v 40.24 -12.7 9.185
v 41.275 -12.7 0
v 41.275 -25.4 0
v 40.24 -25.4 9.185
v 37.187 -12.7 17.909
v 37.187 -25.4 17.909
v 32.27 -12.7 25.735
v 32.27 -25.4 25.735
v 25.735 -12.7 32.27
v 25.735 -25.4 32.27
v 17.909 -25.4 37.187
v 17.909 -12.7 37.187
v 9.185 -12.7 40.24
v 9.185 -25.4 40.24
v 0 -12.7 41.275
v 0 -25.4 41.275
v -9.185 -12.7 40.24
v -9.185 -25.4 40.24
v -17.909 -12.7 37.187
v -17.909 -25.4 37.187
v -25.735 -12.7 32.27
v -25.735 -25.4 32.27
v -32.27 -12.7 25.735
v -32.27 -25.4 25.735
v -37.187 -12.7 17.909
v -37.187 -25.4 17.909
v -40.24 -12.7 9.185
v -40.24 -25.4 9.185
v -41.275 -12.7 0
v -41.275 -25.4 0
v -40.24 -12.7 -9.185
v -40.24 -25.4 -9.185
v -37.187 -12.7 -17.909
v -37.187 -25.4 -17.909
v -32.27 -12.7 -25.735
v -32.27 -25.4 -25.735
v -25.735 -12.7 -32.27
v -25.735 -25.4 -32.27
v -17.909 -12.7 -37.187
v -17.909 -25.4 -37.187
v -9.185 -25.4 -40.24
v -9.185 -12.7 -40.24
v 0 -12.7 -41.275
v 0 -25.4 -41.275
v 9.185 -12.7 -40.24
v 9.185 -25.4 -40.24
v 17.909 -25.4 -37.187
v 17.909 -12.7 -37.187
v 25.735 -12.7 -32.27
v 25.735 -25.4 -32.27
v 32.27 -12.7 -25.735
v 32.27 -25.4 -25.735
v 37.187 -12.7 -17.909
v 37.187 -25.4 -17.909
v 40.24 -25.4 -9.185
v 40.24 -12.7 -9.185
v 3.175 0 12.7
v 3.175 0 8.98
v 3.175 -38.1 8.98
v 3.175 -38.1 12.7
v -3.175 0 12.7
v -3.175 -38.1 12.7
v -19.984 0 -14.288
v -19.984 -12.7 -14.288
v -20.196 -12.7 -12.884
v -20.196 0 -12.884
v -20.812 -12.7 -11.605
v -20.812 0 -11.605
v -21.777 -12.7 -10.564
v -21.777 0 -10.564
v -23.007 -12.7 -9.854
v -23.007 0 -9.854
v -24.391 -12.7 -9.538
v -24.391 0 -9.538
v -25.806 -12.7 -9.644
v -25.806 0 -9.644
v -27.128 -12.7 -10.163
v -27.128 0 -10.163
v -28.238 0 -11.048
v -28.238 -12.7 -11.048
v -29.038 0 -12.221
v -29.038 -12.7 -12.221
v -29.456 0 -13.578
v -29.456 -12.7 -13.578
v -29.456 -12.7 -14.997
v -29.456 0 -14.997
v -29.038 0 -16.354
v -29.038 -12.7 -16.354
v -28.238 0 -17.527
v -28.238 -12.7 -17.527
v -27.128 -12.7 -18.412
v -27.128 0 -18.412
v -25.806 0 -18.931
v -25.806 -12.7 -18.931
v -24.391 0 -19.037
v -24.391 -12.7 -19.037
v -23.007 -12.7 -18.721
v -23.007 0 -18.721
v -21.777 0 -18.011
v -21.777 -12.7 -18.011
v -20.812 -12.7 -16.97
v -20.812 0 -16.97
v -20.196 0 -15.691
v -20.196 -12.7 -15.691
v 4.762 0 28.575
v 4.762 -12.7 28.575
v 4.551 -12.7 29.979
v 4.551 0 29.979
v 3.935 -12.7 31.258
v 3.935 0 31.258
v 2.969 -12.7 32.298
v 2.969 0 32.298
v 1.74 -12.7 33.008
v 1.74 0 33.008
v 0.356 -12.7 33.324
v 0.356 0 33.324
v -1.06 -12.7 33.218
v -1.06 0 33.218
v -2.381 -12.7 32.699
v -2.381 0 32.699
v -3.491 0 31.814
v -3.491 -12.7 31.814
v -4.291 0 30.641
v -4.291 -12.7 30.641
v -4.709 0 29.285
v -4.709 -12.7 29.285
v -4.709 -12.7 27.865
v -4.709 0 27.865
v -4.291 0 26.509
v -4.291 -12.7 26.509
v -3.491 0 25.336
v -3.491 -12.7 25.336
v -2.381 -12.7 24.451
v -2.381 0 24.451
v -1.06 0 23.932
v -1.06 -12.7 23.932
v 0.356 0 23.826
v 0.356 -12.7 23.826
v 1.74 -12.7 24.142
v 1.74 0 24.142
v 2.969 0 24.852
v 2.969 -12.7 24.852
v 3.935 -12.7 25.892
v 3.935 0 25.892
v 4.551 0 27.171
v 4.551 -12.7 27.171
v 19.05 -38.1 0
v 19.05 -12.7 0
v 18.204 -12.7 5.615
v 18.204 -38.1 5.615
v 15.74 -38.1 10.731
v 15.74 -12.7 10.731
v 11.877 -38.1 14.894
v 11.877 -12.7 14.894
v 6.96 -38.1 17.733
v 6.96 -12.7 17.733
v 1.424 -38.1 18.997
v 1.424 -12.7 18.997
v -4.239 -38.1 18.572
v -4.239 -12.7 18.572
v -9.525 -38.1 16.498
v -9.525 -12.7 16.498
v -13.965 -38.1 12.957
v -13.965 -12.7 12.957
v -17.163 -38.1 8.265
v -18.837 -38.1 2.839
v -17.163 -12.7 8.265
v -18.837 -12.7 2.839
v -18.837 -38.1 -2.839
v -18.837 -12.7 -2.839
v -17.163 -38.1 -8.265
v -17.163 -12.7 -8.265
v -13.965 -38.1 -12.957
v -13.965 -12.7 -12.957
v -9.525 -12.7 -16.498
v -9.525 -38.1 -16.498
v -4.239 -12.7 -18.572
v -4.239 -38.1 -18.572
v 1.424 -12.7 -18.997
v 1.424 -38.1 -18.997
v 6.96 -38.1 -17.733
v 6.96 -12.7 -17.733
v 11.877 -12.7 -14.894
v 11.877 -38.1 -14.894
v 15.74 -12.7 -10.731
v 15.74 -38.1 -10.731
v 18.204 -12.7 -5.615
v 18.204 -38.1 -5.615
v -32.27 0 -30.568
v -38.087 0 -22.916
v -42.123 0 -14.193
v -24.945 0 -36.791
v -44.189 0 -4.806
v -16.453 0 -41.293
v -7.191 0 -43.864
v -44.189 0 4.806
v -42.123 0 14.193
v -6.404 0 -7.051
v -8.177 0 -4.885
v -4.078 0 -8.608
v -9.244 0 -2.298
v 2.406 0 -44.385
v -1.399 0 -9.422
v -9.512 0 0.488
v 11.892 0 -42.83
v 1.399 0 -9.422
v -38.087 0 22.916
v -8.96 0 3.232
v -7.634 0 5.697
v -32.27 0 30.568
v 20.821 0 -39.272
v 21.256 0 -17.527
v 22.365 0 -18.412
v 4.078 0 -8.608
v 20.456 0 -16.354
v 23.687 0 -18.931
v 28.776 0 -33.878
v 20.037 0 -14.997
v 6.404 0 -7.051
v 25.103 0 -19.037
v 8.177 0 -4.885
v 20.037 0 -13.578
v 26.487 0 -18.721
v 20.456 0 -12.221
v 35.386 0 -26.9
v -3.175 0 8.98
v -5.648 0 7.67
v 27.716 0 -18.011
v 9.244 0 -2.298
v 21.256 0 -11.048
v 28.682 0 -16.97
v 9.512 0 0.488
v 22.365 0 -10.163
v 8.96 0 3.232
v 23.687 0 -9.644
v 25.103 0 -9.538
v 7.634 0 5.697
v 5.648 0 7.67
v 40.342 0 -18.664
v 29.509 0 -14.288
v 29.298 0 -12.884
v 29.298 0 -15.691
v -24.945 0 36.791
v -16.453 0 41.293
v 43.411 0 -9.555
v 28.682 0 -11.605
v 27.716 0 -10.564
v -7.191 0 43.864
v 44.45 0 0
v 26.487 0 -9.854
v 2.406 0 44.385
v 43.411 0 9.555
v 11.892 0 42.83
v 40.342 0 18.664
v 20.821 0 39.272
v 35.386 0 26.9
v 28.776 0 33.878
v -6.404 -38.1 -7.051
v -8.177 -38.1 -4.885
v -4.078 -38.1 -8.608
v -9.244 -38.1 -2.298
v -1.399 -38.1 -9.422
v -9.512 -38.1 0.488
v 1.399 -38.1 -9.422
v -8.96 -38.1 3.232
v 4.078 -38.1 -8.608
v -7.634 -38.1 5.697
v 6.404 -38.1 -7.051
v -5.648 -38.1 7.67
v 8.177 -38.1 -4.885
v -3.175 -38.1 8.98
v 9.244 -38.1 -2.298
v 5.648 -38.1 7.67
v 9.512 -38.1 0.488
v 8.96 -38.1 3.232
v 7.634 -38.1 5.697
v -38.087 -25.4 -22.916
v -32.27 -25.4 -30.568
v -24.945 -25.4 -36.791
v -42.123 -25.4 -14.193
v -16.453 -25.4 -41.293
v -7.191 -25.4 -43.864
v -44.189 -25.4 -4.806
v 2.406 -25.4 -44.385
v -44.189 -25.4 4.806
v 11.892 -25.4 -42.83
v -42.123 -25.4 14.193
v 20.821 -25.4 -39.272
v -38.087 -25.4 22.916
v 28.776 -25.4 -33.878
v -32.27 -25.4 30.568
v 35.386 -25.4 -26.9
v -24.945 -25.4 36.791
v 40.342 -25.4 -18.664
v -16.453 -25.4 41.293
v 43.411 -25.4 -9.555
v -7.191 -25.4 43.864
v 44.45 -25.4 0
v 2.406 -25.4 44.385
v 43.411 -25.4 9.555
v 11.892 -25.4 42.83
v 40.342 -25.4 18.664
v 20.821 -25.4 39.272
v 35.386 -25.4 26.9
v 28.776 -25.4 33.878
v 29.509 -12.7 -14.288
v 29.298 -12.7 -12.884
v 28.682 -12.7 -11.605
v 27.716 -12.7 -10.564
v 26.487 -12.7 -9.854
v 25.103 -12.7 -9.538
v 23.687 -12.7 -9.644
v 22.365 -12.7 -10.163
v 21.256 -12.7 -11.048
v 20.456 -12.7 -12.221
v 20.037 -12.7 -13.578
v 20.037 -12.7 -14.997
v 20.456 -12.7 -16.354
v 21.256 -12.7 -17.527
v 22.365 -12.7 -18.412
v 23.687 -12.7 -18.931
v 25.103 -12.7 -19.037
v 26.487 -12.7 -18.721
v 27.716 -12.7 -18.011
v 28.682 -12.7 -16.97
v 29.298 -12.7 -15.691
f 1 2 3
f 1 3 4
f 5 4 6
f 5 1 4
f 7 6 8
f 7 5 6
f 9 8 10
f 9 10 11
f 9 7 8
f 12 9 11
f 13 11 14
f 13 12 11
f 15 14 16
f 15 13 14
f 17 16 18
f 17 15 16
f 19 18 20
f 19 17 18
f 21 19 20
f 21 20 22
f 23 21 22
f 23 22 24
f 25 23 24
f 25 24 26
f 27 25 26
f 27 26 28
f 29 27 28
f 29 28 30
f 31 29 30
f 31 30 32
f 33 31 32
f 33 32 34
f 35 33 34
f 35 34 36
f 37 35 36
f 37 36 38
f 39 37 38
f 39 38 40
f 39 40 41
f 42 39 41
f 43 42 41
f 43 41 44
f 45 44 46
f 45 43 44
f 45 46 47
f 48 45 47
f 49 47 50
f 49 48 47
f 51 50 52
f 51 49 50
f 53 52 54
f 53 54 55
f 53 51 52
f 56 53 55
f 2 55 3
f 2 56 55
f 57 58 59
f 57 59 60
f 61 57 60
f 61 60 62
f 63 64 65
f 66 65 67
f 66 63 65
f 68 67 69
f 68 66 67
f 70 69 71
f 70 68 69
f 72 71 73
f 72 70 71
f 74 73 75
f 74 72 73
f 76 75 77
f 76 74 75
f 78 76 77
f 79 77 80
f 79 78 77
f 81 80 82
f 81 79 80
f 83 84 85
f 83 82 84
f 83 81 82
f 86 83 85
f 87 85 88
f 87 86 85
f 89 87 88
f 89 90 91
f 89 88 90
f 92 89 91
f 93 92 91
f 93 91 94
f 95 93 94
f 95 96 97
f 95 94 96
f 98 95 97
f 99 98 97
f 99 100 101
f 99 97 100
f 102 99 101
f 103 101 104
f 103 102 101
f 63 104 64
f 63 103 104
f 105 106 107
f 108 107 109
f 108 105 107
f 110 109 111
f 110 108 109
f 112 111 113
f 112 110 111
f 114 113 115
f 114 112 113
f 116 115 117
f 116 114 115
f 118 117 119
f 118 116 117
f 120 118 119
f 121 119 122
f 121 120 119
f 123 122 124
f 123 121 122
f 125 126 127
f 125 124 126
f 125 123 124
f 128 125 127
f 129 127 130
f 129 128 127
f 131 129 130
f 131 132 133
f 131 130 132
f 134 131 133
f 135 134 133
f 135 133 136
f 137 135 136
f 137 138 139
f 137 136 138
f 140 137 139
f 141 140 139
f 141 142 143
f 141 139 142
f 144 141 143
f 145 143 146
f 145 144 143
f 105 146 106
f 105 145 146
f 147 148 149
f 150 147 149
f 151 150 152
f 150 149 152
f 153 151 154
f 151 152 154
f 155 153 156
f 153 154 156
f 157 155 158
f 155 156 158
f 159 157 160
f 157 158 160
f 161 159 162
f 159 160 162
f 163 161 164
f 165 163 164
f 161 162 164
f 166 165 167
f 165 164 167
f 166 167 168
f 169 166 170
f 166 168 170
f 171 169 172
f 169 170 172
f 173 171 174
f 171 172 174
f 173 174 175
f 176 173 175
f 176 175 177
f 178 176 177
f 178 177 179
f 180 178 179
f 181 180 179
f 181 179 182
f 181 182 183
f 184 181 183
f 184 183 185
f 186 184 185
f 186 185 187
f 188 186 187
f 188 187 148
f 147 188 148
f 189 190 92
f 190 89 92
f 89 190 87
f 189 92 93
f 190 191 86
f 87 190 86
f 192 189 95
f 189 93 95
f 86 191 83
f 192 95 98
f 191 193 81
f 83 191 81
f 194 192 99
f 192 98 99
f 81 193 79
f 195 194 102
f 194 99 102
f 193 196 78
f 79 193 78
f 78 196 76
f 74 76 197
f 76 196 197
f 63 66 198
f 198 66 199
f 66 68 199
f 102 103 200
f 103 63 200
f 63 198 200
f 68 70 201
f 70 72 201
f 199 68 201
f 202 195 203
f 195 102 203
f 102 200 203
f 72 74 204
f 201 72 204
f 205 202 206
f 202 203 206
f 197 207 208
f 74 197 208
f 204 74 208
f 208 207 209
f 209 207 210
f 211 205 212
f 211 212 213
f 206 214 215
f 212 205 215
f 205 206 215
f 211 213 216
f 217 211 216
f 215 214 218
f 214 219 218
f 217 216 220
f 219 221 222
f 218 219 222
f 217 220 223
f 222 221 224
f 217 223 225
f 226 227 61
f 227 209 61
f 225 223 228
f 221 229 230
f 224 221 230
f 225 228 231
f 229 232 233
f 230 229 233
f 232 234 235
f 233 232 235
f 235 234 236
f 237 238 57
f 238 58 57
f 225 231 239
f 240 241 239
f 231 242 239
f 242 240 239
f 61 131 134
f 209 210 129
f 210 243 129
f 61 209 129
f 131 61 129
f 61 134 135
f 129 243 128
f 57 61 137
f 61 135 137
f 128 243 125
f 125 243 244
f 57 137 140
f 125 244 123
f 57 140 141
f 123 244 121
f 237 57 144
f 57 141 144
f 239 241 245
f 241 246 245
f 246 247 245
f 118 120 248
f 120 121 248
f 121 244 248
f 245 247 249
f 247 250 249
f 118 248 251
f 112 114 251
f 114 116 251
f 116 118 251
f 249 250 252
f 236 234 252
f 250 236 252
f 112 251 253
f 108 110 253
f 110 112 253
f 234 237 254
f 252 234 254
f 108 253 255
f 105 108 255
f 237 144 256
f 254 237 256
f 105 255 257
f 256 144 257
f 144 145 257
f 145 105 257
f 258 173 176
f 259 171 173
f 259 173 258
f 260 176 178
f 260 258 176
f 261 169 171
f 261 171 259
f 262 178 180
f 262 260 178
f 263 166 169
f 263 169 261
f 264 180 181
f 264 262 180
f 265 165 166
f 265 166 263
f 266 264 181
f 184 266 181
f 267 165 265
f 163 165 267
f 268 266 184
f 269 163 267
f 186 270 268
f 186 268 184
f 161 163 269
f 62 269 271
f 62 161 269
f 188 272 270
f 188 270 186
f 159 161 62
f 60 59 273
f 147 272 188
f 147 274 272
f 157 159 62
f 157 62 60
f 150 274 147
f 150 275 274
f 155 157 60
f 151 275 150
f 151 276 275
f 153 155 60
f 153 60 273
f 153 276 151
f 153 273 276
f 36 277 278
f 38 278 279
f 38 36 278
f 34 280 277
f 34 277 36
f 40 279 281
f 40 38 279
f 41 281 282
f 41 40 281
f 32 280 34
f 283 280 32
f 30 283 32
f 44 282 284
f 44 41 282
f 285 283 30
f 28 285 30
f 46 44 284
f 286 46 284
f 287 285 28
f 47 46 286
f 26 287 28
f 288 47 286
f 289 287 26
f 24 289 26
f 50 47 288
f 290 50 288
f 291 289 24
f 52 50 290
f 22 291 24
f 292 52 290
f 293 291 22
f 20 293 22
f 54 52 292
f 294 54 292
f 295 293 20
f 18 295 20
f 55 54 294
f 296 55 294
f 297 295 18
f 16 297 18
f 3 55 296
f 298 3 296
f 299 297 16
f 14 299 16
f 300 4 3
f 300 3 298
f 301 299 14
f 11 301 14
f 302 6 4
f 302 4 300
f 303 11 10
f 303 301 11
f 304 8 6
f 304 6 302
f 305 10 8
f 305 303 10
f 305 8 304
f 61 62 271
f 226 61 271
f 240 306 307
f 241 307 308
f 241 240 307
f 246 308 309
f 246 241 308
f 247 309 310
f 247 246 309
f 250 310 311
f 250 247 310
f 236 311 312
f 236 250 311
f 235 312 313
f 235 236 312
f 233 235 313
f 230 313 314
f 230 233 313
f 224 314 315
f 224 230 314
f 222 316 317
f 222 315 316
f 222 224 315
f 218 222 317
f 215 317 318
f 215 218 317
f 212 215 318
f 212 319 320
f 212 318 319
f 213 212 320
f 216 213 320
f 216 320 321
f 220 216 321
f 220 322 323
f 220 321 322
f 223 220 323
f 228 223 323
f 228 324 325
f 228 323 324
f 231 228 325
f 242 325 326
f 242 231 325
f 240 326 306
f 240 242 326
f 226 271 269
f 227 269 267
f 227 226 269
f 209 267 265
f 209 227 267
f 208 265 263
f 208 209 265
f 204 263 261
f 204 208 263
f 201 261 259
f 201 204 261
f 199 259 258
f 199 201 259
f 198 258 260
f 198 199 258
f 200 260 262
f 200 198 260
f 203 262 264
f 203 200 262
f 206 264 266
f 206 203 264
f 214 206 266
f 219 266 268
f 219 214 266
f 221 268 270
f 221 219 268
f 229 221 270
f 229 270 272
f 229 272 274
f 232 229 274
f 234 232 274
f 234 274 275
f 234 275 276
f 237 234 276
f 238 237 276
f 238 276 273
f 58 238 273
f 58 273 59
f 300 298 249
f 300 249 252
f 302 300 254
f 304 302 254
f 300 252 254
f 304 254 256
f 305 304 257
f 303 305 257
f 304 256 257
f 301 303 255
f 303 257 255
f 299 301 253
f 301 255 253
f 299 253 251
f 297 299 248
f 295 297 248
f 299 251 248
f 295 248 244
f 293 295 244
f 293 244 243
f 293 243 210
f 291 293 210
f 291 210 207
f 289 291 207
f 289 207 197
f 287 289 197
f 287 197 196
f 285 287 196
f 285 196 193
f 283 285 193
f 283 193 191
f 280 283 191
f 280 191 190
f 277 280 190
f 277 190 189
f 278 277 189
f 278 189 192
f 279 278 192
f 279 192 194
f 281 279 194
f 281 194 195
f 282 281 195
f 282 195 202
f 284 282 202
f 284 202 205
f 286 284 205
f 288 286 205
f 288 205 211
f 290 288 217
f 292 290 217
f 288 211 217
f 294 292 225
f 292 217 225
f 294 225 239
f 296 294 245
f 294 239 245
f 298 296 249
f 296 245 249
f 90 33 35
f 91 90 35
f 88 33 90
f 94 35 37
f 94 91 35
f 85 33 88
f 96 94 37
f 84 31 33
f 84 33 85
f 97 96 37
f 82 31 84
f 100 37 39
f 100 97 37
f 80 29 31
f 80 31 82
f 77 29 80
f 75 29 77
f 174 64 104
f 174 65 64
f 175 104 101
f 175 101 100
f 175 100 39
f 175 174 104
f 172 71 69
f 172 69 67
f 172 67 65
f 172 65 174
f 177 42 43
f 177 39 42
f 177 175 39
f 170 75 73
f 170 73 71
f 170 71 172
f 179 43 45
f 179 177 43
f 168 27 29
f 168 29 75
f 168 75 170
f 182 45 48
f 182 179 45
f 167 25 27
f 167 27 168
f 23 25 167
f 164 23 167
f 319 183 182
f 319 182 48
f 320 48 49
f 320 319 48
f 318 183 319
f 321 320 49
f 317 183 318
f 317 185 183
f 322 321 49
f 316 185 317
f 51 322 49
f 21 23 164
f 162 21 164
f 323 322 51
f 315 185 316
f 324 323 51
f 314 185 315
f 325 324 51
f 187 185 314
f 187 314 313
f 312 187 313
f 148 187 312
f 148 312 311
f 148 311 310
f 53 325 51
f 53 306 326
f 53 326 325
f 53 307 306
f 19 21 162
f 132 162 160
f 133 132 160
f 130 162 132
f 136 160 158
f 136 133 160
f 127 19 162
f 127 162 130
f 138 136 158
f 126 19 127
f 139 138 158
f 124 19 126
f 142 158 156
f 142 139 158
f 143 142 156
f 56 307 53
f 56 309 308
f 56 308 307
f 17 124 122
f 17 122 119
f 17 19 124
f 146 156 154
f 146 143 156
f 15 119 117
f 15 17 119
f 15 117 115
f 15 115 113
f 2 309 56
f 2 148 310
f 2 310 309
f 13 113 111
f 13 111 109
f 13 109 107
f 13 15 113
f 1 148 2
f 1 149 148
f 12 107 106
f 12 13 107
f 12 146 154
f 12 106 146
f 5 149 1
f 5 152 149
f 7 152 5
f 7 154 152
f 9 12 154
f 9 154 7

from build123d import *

# Parameters (mm, degrees)
F0_R      = 44.45
F1_DEPTH  = 12.7
F2_R      = 19.05
F3_DEPTH  = 38.1
F4_R      = 9.525
F5_DEPTH  = 38.101
F7_DEPTH  = 38.101
F8_R      = 4.7625
F9_DEPTH  = 38.101
F10_R     = 44.45
F10_R_2   = 41.275
F11_DEPTH = 25.4


with BuildPart() as f1:
    # F0 (on Front) → F1 (new body)
    with BuildSketch(Plane.XZ):
        Circle(F0_R)
    extrude(amount=F1_DEPTH)

    # F2 (on Front) → F3 (join)
    with BuildSketch(Plane.XZ):
        Circle(F2_R)
    extrude(amount=F3_DEPTH)

    # F4 (on Front) → F5 (cut, through all)
    with BuildSketch(Plane.XZ):
        Circle(F4_R)
    extrude(amount=F5_DEPTH, mode=Mode.SUBTRACT)

    # F6 (on Front) → F7 (cut, through all)
    with BuildSketch(Plane.XZ):
        Polygon((-3.175, 0), (0, 0), (3.175, 0), (3.175, 12.7), (0, 12.7), (-3.175, 12.7), align=None)
    extrude(amount=F7_DEPTH, mode=Mode.SUBTRACT)

    # F8 (on Front) → F9 (cut, through all)
    with BuildSketch(Plane.XZ):
        with Locations((0, 28.575)):
            Circle(F8_R)
        with Locations((-24.746676, -14.2875)):
            Circle(F8_R)
        with Locations((24.746676, -14.2875)):
            Circle(F8_R)
    extrude(amount=F9_DEPTH, mode=Mode.SUBTRACT)

    # F10 (on Front) → F11 (join)
    with BuildSketch(Plane.XZ):
        Circle(F10_R)
        Circle(F10_R_2, mode=Mode.SUBTRACT)
    extrude(amount=F11_DEPTH)


solid = f1.part
